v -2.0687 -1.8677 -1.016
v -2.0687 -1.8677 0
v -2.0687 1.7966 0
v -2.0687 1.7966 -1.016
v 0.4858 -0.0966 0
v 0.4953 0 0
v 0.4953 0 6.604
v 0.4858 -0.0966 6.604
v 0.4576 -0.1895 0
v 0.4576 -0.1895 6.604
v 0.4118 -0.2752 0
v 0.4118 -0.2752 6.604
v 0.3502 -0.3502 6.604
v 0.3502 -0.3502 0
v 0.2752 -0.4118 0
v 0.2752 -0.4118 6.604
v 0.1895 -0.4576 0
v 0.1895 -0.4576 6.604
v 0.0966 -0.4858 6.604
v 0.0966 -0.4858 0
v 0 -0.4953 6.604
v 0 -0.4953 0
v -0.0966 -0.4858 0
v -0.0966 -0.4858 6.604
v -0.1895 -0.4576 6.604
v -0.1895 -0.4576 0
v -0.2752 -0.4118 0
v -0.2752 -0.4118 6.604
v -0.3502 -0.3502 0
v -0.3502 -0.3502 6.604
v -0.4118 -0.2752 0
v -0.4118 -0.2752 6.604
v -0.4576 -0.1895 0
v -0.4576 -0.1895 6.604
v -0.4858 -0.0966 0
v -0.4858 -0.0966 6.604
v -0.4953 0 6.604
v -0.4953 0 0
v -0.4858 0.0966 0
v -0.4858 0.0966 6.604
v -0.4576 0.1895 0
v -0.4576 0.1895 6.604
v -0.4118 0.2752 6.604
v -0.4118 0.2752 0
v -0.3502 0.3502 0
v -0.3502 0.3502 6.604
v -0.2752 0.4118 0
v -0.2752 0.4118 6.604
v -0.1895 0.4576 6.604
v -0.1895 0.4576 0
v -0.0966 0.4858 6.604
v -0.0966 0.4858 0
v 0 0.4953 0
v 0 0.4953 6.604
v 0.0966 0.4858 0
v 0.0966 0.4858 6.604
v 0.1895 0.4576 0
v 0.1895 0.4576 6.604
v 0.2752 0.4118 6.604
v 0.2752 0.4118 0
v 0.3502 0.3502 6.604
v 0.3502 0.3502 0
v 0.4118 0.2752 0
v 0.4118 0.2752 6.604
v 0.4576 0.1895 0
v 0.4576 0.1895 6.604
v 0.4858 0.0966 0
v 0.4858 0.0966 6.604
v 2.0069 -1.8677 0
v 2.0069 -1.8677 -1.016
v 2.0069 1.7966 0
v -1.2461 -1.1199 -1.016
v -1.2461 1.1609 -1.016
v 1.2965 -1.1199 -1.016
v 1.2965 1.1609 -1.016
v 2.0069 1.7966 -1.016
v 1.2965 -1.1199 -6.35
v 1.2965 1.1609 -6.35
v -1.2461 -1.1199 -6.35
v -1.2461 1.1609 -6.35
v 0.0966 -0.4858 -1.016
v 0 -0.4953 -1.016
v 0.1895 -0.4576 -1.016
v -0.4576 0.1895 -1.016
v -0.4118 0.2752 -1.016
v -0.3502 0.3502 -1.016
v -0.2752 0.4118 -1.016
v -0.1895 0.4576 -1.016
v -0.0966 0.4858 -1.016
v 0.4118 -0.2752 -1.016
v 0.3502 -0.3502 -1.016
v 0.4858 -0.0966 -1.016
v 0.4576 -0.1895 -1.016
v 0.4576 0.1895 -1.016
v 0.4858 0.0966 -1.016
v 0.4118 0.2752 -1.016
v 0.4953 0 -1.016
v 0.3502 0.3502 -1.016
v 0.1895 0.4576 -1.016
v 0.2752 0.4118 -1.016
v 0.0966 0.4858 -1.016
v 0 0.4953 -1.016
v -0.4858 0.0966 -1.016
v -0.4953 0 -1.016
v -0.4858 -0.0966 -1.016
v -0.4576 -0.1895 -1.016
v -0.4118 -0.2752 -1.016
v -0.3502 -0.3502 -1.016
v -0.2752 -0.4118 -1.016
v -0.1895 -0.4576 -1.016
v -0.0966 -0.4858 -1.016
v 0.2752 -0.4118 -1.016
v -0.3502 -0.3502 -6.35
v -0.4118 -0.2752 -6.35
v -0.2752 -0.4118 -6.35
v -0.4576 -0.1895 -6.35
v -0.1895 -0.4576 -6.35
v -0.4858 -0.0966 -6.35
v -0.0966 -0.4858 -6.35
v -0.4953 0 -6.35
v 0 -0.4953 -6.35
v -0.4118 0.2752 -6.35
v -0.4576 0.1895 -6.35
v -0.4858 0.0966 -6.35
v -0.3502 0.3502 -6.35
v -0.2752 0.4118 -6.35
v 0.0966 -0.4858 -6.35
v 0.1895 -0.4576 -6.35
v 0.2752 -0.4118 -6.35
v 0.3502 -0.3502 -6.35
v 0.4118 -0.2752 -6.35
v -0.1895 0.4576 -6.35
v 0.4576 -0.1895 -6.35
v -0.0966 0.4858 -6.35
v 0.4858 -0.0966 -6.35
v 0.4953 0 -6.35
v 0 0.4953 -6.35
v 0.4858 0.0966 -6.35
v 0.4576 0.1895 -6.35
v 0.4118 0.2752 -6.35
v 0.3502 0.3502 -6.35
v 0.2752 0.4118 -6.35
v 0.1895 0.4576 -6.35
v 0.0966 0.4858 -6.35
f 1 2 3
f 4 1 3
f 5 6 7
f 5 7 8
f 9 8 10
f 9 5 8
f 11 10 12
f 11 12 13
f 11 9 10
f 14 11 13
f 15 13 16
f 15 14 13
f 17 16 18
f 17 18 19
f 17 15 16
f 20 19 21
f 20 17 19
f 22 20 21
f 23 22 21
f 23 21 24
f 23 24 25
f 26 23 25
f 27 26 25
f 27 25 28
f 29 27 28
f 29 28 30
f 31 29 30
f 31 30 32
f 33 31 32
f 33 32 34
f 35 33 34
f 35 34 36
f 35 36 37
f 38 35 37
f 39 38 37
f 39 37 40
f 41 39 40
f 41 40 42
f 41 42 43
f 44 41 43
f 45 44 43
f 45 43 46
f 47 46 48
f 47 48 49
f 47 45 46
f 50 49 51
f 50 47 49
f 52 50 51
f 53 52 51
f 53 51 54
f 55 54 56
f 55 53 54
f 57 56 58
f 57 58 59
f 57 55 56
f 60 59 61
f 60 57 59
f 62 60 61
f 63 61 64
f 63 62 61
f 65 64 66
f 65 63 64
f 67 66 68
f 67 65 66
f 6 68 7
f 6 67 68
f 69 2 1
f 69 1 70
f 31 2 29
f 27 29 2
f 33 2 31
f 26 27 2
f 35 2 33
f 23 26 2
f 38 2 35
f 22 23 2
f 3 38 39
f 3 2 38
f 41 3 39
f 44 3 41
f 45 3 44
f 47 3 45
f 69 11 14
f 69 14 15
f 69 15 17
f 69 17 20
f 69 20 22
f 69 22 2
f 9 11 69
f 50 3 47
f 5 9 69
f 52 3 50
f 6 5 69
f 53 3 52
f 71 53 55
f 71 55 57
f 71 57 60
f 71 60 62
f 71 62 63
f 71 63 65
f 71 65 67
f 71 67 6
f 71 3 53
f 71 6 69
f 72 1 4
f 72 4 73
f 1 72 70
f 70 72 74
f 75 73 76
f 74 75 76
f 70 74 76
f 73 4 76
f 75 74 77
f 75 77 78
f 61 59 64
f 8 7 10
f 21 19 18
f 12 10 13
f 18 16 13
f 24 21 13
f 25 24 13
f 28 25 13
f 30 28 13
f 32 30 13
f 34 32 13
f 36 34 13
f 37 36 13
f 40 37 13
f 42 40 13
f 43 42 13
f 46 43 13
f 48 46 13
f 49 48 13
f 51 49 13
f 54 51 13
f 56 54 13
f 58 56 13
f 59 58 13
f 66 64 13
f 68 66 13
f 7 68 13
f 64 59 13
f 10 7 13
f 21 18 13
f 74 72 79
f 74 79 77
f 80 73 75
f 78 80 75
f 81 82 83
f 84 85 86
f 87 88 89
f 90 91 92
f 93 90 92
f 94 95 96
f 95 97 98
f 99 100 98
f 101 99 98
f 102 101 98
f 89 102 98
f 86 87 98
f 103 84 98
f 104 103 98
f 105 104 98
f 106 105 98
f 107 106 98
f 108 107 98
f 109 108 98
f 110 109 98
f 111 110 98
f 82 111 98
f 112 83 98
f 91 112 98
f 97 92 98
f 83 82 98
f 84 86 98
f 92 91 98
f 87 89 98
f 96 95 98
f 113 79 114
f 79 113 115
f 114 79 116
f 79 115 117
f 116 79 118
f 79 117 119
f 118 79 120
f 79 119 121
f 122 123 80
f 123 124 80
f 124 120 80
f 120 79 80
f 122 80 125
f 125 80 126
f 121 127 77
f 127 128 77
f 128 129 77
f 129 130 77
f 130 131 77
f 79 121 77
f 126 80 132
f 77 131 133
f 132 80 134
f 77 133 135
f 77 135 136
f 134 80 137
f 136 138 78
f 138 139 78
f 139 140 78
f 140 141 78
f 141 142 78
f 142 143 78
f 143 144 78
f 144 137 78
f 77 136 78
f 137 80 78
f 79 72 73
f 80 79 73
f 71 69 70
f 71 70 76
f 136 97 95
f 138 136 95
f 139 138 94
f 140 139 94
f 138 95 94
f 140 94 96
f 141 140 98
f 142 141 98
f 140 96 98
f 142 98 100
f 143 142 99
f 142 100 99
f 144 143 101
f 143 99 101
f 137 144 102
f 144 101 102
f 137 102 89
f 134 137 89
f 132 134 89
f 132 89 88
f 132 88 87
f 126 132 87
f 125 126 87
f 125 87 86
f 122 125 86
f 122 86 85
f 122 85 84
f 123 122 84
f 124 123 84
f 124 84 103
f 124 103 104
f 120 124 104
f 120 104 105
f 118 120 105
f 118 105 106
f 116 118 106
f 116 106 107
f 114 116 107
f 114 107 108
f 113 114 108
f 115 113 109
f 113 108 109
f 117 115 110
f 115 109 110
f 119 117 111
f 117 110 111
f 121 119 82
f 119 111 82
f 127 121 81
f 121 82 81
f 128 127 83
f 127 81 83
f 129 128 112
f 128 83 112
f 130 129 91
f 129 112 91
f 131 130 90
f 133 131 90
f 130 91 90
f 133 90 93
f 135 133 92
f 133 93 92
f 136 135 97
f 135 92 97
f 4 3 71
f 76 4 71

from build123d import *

# Parameters (mm, degrees)
F0_W      = 2.542533
F0_H      = 2.280801
F0_R      = 0.4953
F2_DEPTH  = 6.35
F1_W      = 4.075531
F1_H      = 3.664239
F3_DEPTH  = 1.016
F3_FACE_R = 0.4953
F4_DEPTH  = 7.62


with BuildPart() as f2:
    # F0 (on Top) → F2 (new body)
    with BuildSketch(Plane.XY):
        with Locations((0.025189, 0.020531)):
            Rectangle(F0_W, F0_H)
        Circle(F0_R, mode=Mode.SUBTRACT)
    extrude(amount=-F2_DEPTH)

    # F1 (on Top) → F3 (join)
    with BuildSketch(Plane.XY):
        with Locations((-0.030896, -0.035554)):
            Rectangle(F1_W, F1_H)
    extrude(amount=-F3_DEPTH)

    # F3_face (on face) → F4 (join)
    with BuildSketch(Plane(origin=(0, 0, -1.016), x_dir=(1, 0, 0), z_dir=(0, 0, -1))):
        Circle(F3_FACE_R)
    extrude(amount=-F4_DEPTH)


solid = f2.part
